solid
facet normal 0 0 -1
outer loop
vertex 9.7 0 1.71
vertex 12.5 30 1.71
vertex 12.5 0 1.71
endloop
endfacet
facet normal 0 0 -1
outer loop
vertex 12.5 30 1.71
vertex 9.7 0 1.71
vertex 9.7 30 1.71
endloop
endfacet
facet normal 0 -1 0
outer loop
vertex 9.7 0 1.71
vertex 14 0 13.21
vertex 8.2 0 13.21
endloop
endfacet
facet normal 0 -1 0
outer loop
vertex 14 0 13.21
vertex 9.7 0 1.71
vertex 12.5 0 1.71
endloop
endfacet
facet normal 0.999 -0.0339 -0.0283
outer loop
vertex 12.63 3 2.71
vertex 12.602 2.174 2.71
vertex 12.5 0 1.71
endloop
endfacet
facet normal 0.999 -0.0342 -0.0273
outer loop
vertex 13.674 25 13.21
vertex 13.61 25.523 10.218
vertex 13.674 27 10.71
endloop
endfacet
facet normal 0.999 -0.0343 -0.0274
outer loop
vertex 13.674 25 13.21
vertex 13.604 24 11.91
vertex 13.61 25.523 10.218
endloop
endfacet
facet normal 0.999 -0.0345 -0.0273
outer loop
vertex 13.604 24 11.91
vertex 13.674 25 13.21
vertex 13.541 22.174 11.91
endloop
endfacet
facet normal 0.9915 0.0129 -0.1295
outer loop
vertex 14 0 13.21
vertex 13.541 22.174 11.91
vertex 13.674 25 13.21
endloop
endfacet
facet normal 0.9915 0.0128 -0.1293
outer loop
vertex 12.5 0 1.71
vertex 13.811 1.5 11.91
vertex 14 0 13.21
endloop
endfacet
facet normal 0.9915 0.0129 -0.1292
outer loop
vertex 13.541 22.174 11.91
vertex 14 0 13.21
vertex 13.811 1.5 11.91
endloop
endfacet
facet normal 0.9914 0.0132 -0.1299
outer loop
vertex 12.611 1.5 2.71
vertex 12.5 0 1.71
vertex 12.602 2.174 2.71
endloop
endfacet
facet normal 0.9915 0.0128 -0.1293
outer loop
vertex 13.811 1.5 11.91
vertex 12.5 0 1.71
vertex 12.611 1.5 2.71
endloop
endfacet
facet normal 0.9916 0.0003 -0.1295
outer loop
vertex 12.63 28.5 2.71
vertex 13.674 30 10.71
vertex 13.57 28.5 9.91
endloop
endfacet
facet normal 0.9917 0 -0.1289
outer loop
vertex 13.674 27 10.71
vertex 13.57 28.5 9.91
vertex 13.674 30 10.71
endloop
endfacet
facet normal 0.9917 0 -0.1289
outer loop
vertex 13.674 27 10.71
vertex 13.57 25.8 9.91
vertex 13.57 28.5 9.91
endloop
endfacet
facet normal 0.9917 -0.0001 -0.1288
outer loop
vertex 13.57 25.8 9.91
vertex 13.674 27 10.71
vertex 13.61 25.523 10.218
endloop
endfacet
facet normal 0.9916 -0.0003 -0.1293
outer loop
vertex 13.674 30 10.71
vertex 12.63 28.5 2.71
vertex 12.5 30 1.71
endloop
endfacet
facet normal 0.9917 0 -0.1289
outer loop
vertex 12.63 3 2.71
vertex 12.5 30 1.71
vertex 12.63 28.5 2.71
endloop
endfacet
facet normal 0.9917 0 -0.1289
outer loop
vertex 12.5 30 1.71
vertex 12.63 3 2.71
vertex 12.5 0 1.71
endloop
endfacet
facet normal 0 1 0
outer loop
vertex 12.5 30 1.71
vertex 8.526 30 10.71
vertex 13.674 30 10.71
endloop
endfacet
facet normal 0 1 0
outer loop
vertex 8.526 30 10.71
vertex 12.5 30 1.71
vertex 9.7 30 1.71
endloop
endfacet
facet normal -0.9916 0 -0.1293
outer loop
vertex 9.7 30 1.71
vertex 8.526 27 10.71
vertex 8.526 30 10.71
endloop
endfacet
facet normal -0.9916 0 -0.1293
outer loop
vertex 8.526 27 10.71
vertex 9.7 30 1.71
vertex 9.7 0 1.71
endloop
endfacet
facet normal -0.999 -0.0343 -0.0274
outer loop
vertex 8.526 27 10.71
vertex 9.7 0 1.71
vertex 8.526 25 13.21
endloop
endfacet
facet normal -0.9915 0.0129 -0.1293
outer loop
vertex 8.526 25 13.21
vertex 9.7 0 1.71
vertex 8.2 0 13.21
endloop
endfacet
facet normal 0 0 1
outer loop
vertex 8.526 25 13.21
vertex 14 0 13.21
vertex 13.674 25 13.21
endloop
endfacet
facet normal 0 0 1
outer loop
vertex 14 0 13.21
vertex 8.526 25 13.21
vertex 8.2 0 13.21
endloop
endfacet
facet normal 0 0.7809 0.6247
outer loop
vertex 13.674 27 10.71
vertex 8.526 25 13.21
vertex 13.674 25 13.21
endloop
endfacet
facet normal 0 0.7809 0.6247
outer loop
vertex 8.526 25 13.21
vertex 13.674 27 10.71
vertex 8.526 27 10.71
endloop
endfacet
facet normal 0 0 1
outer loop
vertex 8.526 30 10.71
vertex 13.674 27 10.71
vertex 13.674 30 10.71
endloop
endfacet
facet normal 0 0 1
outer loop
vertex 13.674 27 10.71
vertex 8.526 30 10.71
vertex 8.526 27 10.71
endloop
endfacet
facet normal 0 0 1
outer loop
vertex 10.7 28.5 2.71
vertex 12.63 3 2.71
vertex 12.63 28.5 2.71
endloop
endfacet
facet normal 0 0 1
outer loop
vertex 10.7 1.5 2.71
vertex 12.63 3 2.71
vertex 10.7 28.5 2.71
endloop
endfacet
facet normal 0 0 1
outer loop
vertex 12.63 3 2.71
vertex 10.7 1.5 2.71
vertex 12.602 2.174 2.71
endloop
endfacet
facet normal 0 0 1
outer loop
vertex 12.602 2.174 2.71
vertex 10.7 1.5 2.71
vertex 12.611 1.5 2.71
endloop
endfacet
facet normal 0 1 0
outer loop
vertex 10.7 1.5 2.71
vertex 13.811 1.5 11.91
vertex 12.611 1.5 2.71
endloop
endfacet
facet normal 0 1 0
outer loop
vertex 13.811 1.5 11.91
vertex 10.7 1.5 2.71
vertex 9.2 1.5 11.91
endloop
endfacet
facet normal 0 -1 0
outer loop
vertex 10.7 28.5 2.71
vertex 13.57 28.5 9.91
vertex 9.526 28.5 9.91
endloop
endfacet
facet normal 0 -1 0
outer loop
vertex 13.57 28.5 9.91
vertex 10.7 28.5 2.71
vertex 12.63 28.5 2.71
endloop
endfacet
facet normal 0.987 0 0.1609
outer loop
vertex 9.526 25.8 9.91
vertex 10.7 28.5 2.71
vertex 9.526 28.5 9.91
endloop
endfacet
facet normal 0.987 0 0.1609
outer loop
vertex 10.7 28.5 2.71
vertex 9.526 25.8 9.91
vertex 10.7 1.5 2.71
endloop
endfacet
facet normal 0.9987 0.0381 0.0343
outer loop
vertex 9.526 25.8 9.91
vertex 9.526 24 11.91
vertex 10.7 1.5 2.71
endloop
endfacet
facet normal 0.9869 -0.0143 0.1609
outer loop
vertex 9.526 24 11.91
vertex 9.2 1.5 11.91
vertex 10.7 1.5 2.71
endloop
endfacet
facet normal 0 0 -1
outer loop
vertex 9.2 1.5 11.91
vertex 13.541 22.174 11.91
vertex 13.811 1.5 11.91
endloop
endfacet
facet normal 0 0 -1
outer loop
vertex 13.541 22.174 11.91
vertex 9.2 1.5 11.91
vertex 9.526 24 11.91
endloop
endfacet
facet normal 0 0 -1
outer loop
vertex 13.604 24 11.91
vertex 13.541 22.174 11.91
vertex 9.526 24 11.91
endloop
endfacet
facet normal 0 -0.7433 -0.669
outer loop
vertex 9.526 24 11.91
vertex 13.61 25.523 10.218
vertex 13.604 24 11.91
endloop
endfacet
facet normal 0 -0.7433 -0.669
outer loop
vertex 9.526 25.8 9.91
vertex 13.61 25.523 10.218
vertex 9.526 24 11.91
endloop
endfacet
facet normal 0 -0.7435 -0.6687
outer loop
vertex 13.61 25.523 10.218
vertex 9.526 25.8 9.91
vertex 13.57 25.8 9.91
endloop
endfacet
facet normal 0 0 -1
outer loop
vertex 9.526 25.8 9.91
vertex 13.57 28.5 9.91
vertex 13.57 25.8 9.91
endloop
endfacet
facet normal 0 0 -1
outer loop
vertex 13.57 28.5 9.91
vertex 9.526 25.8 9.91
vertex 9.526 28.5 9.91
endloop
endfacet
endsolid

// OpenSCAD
l = 3;
dlu = 1.4;
dlo = 2.9;
w= 30;
h= 11.5;
uo = 9;
uxo = 25;
uxu = 27;

module einschubForm(untereBr,obereBr,absend,absanf,abshoehe,hoehe,breite)
{
  obVerjBreite = (obereBr-untereBr)*abshoehe/hoehe+untereBr;
  polyhedron(
      points=[[-untereBr,0,0], [untereBr,0,0], [untereBr,breite,0], [-untereBr,breite,0], //unteres Rechteck 
      [-obereBr,0,hoehe],[obereBr,0,hoehe], [obVerjBreite,breite,abshoehe],[-obVerjBreite,breite,abshoehe]    //oberes Rechteck
      ,[-obVerjBreite,absanf,hoehe], [-obVerjBreite,absend, abshoehe], [obVerjBreite,absend, abshoehe], [obVerjBreite,absanf,hoehe] //Absenkung
      ,[-untereBr,absanf,0], [-untereBr,absend, 0], [untereBr,absend, 0], [untereBr,absanf,0]
      ],  

      faces=[
      [0,1,2,3], //unten
      [5,1,0,4], //stirn links
      [1,5,11,10,6,2], //hinten
      [2,6,7,3], //stirn rechts 
      [0,3,7,9,8,4], //vorne
      [4,8,11,5], [8,9,10,11], [9,7,6,10]  //oben
      ]
      );
}

posx = 11.1;
posy = 0;
posz = 1.71;
translate([posx,posy,posz])
{
  difference()
  {
    einschubForm(dlu,dlo,uxu,uxo,uo,h,w);
    color("blue") translate([1,1.5,1])scale(v = [1, .9, .8]) einschubForm(dlu,dlo,uxu,uxo,uo,h,w);
  }
}
